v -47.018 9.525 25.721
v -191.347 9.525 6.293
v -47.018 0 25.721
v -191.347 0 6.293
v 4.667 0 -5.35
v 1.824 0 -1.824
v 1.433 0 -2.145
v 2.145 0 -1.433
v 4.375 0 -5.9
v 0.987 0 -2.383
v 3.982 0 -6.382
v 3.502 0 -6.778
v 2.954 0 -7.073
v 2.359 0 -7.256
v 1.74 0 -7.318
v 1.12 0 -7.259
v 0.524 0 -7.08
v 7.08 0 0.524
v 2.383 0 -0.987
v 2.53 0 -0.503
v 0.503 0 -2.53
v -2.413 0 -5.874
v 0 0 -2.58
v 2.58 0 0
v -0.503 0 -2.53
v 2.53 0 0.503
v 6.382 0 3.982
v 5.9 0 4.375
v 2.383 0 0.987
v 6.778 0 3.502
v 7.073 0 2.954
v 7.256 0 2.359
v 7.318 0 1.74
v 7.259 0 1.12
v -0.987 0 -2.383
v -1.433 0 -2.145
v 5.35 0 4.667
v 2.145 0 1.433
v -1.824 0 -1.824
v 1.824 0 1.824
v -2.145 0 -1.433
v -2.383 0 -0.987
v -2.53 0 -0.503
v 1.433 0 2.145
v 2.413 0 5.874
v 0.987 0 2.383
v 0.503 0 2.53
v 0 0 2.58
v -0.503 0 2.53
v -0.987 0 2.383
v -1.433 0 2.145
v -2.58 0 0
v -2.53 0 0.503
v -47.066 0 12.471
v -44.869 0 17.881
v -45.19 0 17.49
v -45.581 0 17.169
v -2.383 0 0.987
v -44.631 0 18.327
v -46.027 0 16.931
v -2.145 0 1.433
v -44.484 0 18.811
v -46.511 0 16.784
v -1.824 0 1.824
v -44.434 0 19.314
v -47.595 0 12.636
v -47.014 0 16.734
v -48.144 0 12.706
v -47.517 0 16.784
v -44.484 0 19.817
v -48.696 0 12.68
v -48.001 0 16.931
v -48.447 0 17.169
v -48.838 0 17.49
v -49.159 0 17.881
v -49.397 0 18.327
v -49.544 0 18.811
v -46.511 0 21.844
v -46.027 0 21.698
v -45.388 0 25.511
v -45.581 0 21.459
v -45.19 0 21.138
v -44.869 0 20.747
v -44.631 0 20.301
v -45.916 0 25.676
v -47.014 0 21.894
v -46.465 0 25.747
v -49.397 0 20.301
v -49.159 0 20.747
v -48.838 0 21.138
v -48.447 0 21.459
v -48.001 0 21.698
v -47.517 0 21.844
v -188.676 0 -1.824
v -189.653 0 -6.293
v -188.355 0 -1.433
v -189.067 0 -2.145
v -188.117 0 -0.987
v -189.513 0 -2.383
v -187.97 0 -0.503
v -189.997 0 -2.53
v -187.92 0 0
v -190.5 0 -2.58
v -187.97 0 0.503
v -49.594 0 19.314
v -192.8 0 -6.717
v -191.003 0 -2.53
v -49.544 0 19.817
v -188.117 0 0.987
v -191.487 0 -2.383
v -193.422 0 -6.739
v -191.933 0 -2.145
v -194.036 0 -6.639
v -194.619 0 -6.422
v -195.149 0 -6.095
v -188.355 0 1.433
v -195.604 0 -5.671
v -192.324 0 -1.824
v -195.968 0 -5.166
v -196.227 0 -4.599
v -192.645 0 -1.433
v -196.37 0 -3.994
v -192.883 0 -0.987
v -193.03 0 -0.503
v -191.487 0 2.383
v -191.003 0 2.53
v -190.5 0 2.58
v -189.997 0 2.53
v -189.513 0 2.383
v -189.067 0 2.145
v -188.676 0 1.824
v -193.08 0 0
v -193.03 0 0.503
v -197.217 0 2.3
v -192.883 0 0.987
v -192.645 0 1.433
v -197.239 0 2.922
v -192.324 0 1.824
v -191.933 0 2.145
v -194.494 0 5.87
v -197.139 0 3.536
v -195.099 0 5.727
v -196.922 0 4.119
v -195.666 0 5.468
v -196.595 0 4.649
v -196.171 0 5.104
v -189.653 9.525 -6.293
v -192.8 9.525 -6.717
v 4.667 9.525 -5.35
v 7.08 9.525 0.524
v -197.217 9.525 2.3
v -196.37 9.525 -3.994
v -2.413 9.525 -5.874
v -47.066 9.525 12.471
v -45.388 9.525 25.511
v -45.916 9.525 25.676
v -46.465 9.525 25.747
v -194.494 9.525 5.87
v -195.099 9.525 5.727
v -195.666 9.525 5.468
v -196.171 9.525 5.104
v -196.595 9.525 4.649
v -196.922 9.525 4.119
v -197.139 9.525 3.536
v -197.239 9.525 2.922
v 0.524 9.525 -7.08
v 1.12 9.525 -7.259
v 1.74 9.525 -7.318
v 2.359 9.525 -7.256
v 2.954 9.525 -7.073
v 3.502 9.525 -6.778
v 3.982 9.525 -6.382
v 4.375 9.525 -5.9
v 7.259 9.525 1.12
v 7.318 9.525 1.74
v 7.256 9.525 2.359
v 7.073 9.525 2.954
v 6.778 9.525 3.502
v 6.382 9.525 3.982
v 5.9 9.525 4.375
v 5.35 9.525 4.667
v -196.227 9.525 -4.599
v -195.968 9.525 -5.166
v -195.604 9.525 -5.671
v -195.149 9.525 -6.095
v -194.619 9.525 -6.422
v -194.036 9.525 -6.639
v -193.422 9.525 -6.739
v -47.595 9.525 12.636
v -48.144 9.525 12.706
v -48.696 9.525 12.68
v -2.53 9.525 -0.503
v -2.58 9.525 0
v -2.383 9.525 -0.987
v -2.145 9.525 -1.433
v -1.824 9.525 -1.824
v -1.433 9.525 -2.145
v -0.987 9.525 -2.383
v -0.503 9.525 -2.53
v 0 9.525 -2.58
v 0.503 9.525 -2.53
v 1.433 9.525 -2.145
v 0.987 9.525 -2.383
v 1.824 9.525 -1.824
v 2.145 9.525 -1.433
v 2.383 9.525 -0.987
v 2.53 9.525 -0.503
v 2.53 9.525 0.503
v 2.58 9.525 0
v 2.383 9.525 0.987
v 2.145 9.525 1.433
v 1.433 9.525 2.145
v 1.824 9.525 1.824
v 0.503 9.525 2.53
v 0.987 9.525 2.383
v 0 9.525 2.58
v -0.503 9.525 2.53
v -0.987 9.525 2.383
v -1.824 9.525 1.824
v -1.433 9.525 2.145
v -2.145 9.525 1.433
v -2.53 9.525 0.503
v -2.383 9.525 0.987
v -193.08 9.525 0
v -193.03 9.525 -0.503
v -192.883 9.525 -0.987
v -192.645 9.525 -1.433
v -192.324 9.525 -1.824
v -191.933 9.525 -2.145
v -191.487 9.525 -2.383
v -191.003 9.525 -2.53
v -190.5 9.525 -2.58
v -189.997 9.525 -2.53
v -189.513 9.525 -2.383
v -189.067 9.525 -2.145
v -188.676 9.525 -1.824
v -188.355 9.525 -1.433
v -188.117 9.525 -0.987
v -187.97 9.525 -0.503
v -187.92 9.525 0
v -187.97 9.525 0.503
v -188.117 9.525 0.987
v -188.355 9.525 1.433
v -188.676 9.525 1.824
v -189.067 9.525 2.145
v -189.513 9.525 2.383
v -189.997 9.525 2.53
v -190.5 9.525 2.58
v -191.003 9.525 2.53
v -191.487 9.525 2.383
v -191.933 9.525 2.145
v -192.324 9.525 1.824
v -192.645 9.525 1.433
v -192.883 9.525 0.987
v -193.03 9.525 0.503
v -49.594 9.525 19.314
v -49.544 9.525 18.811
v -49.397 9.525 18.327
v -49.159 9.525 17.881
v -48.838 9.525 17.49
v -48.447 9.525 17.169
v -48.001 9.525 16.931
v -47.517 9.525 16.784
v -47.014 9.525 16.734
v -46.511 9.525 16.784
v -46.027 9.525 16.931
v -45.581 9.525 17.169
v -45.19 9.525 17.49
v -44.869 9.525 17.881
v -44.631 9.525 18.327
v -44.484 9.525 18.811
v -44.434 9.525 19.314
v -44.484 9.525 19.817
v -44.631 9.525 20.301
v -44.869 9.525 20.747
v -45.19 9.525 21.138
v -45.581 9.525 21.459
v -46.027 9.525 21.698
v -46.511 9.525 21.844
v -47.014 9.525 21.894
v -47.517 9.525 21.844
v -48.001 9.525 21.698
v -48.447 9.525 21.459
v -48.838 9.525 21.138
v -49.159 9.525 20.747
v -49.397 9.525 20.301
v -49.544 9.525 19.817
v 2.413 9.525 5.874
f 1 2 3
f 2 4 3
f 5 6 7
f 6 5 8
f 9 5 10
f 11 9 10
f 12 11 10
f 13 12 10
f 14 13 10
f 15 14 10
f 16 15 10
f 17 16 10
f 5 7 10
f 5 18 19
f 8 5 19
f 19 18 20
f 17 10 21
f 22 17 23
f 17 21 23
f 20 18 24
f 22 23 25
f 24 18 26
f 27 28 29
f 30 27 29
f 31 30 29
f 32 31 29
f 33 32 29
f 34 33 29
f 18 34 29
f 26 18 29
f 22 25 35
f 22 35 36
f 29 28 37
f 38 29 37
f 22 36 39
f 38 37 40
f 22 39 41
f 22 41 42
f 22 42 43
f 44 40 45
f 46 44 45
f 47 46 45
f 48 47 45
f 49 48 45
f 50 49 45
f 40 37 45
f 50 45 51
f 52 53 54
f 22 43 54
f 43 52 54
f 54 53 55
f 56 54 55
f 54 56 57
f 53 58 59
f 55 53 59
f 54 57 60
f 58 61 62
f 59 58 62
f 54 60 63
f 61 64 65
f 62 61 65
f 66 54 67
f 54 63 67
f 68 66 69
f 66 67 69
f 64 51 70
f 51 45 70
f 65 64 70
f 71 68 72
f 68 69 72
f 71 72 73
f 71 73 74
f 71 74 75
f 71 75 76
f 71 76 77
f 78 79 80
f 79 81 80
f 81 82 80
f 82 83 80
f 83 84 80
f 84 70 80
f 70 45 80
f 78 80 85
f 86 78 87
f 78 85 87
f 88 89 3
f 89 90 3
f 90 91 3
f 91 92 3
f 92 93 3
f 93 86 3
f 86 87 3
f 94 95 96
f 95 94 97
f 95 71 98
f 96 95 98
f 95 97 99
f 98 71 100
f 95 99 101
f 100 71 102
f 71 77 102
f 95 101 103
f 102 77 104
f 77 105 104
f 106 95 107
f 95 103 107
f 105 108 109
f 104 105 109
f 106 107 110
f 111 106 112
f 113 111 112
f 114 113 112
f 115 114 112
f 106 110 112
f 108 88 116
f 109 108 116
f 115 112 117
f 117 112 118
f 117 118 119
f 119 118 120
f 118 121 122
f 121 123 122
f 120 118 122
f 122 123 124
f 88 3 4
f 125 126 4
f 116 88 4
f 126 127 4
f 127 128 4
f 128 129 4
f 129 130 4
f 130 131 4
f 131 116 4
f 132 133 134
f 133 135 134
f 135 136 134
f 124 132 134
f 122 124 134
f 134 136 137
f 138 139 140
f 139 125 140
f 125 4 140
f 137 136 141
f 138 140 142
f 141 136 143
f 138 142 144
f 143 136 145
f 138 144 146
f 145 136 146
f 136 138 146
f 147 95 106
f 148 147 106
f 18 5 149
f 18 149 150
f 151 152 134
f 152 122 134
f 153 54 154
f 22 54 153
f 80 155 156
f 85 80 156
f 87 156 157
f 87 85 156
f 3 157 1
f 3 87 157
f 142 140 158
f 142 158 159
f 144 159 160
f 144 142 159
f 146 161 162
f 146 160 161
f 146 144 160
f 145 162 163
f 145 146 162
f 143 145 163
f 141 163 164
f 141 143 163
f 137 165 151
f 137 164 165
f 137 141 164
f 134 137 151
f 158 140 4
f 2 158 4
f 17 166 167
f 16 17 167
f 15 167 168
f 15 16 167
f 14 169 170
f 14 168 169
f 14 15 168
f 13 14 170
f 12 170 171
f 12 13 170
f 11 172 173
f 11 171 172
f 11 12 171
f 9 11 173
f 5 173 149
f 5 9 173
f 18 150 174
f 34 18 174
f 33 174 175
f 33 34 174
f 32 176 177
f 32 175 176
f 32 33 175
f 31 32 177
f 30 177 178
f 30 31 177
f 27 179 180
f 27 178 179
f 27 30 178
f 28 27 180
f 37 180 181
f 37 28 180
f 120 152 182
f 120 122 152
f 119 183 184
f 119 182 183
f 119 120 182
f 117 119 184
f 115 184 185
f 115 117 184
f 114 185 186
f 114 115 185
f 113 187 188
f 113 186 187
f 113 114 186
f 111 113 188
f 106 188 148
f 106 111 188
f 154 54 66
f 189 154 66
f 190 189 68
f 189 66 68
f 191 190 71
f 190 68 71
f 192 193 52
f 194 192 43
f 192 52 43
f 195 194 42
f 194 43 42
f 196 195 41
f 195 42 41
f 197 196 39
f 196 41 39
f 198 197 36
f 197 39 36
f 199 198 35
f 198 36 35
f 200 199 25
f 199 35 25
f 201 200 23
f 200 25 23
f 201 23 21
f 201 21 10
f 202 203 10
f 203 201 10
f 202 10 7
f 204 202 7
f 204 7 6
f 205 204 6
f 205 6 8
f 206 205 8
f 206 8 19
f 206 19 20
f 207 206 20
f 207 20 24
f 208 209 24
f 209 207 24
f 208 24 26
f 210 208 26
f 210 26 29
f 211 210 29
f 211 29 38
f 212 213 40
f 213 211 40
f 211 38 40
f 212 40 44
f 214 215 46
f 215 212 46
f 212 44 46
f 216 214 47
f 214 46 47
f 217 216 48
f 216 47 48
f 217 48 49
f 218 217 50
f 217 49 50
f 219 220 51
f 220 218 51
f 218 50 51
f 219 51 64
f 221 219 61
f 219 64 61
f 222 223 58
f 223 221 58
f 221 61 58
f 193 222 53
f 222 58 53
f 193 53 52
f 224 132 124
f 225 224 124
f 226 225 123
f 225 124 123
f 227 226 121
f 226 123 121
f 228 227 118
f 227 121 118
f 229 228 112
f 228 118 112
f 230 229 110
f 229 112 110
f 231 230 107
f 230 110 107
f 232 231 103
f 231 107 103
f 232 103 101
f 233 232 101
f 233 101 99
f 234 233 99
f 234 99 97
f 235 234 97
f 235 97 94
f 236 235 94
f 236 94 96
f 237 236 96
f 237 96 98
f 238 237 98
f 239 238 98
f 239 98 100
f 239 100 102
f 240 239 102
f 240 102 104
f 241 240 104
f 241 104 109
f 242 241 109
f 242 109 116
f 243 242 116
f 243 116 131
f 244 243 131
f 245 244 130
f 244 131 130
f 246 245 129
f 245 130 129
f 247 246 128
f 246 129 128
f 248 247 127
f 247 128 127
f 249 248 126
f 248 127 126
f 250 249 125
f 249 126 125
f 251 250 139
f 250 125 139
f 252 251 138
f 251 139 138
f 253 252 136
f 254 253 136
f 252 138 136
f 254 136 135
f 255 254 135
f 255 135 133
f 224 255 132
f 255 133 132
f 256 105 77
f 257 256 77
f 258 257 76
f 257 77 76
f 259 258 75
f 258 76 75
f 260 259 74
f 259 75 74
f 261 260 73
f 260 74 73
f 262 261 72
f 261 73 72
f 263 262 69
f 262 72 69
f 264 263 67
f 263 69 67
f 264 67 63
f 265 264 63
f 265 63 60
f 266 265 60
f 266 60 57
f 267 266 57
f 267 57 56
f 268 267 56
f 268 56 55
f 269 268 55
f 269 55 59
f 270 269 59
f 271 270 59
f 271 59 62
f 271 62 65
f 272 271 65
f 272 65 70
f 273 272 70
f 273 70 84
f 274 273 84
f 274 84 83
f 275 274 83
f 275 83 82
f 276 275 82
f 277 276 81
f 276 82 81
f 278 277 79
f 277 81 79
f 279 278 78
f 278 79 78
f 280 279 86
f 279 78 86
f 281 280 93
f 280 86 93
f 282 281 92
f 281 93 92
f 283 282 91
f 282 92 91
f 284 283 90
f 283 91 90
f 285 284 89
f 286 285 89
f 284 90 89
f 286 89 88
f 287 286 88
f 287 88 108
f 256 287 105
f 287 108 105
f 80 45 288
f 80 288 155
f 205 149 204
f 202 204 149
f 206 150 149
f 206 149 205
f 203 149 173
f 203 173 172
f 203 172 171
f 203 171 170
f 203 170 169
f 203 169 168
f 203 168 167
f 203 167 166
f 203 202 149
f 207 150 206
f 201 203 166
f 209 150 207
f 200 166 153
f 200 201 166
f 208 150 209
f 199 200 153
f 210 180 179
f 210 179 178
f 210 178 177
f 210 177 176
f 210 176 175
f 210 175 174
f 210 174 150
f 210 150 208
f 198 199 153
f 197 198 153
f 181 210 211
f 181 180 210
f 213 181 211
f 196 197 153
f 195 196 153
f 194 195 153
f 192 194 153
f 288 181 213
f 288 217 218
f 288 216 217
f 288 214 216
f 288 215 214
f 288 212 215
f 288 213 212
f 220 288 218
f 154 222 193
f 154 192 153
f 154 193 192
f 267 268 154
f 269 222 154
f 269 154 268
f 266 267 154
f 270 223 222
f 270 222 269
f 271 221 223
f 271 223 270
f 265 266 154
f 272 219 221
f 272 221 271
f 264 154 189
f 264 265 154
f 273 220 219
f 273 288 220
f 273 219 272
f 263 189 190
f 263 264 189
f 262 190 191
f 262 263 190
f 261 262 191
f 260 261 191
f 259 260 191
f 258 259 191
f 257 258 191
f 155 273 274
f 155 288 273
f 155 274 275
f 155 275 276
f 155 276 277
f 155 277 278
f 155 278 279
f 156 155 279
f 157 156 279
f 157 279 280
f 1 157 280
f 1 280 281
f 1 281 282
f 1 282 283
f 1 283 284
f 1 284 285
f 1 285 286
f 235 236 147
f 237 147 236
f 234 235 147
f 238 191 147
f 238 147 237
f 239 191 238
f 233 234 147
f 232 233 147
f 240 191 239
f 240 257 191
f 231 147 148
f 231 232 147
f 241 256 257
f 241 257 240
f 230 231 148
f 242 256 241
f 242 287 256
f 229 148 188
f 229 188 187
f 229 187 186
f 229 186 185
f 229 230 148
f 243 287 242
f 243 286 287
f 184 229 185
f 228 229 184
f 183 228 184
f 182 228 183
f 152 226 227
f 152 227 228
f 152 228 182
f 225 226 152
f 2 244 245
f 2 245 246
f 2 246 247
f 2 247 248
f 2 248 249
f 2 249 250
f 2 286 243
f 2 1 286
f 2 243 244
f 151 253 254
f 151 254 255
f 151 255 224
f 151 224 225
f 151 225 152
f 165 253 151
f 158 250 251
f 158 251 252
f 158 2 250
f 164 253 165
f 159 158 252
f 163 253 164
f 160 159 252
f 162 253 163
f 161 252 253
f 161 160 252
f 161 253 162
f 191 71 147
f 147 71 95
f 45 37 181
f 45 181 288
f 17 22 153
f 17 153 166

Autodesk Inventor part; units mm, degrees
ref_plane "YZ Plane" through (0, 0, 0) normal (1, 0, 0) x (0, 1, 0)
ref_plane "XZ Plane" through (0, 0, 0) normal (0, 1, 0) x (-1, 0, 0)
ref_plane "XY Plane" through (0, 0, 0) normal (0, 0, 1) x (1, 0, 0)
sketch "Sketch1" plane through (0, 0, 0) normal (0, 1, 0) x (-1, 0, 0)
  line L0 (0, 0) -> (190.5, 0)
  line L1 (190.5, 0) -> (47.0141, 19.3142)
  line L2 (47.0141, 19.3142) -> (0, 0)
  line L3 (2.413, -5.8737) -> (-2.413, 5.8737)
  line L4 (-2.413, 5.8737) -> (45.388, 25.5111)
  line L5 (47.0663, 12.4707) -> (2.413, -5.8737)
  line L6 (41.2492, 26.4974) -> (39.555, 13.9109)
  line L7 (48.6964, 12.6805) -> (189.6529, -6.2932)
  line L8 (189.6529, -6.2932) -> (191.3471, 6.2932)
  line L9 (191.3471, 6.2932) -> (47.0181, 25.7209)
  arc A0 (47.0181, 25.7209) -> (45.388, 25.5111) centre (46.5945, 22.5743) ccw
  arc A1 (48.6964, 12.6805) -> (47.0663, 12.4707) centre (48.2728, 9.5338) ccw
  circle A2 centre (47.0141, 19.3142) radius 2.5797
  circle A3 centre (190.5, 0) radius 2.5797
  circle A4 centre (0, 0) radius 2.5797
  line L10 (191.3471, 6.2932) -> (189.6529, -6.2932)
  line L11 (189.6529, -6.2932) -> (192.7995, -6.7168)
  line L12 (196.3697, -3.9937) -> (197.2168, 2.2995)
  line L13 (194.4937, 5.8697) -> (191.3471, 6.2932)
  arc A5 (197.2168, 2.2995) -> (194.4937, 5.8697) centre (194.0702, 2.7231) ccw
  arc A6 (192.7995, -6.7168) -> (196.3697, -3.9937) centre (193.2231, -3.5702) ccw
  line L14 (-2.413, 5.8737) -> (2.413, -5.8737)
  line L15 (2.413, -5.8737) -> (-0.5238, -7.0802)
  line L16 (-4.6672, -5.3498) -> (-7.0802, 0.5238)
  line L17 (-5.3498, 4.6672) -> (-2.413, 5.8737)
  arc A7 (-5.3498, 4.6672) -> (-7.0802, 0.5238) centre (-4.1433, 1.7303) ccw
  arc A8 (-4.6672, -5.3498) -> (-0.5238, -7.0802) centre (-1.7303, -4.1433) ccw
  point P0 (195.9461, -7.1404)
  point P1 (-3.4607, -8.2867)
  dimension "d0" = 190.5
  dimension "d1" = 150
  dimension "d2" = 12.7
  dimension "d3" = 3.175
  dimension "d4" = 5.1594
  dimension "d6" = 6.35
  dimension "d7" = 3.175
  dimension "d8" = 6.35
  dimension "d9" = 3.175
  dimension "d12" = 144.78
extrude "Extrusion1" add sketch "Sketch1" along normal blind 9.525 contours A4 L2 A2 L1 A3 L0 L7 A1 L5 | L0 L5 L3 A4 | A4 L3 L4 L6 L2 | L3 L15 A8 L16 A7 L17 A4 | L6 L4 A0 L9 L8 A3 L1 A2 L2 | L0 A3 L8 L7 | L8 A3 L13 A5 L12 A6 L11
